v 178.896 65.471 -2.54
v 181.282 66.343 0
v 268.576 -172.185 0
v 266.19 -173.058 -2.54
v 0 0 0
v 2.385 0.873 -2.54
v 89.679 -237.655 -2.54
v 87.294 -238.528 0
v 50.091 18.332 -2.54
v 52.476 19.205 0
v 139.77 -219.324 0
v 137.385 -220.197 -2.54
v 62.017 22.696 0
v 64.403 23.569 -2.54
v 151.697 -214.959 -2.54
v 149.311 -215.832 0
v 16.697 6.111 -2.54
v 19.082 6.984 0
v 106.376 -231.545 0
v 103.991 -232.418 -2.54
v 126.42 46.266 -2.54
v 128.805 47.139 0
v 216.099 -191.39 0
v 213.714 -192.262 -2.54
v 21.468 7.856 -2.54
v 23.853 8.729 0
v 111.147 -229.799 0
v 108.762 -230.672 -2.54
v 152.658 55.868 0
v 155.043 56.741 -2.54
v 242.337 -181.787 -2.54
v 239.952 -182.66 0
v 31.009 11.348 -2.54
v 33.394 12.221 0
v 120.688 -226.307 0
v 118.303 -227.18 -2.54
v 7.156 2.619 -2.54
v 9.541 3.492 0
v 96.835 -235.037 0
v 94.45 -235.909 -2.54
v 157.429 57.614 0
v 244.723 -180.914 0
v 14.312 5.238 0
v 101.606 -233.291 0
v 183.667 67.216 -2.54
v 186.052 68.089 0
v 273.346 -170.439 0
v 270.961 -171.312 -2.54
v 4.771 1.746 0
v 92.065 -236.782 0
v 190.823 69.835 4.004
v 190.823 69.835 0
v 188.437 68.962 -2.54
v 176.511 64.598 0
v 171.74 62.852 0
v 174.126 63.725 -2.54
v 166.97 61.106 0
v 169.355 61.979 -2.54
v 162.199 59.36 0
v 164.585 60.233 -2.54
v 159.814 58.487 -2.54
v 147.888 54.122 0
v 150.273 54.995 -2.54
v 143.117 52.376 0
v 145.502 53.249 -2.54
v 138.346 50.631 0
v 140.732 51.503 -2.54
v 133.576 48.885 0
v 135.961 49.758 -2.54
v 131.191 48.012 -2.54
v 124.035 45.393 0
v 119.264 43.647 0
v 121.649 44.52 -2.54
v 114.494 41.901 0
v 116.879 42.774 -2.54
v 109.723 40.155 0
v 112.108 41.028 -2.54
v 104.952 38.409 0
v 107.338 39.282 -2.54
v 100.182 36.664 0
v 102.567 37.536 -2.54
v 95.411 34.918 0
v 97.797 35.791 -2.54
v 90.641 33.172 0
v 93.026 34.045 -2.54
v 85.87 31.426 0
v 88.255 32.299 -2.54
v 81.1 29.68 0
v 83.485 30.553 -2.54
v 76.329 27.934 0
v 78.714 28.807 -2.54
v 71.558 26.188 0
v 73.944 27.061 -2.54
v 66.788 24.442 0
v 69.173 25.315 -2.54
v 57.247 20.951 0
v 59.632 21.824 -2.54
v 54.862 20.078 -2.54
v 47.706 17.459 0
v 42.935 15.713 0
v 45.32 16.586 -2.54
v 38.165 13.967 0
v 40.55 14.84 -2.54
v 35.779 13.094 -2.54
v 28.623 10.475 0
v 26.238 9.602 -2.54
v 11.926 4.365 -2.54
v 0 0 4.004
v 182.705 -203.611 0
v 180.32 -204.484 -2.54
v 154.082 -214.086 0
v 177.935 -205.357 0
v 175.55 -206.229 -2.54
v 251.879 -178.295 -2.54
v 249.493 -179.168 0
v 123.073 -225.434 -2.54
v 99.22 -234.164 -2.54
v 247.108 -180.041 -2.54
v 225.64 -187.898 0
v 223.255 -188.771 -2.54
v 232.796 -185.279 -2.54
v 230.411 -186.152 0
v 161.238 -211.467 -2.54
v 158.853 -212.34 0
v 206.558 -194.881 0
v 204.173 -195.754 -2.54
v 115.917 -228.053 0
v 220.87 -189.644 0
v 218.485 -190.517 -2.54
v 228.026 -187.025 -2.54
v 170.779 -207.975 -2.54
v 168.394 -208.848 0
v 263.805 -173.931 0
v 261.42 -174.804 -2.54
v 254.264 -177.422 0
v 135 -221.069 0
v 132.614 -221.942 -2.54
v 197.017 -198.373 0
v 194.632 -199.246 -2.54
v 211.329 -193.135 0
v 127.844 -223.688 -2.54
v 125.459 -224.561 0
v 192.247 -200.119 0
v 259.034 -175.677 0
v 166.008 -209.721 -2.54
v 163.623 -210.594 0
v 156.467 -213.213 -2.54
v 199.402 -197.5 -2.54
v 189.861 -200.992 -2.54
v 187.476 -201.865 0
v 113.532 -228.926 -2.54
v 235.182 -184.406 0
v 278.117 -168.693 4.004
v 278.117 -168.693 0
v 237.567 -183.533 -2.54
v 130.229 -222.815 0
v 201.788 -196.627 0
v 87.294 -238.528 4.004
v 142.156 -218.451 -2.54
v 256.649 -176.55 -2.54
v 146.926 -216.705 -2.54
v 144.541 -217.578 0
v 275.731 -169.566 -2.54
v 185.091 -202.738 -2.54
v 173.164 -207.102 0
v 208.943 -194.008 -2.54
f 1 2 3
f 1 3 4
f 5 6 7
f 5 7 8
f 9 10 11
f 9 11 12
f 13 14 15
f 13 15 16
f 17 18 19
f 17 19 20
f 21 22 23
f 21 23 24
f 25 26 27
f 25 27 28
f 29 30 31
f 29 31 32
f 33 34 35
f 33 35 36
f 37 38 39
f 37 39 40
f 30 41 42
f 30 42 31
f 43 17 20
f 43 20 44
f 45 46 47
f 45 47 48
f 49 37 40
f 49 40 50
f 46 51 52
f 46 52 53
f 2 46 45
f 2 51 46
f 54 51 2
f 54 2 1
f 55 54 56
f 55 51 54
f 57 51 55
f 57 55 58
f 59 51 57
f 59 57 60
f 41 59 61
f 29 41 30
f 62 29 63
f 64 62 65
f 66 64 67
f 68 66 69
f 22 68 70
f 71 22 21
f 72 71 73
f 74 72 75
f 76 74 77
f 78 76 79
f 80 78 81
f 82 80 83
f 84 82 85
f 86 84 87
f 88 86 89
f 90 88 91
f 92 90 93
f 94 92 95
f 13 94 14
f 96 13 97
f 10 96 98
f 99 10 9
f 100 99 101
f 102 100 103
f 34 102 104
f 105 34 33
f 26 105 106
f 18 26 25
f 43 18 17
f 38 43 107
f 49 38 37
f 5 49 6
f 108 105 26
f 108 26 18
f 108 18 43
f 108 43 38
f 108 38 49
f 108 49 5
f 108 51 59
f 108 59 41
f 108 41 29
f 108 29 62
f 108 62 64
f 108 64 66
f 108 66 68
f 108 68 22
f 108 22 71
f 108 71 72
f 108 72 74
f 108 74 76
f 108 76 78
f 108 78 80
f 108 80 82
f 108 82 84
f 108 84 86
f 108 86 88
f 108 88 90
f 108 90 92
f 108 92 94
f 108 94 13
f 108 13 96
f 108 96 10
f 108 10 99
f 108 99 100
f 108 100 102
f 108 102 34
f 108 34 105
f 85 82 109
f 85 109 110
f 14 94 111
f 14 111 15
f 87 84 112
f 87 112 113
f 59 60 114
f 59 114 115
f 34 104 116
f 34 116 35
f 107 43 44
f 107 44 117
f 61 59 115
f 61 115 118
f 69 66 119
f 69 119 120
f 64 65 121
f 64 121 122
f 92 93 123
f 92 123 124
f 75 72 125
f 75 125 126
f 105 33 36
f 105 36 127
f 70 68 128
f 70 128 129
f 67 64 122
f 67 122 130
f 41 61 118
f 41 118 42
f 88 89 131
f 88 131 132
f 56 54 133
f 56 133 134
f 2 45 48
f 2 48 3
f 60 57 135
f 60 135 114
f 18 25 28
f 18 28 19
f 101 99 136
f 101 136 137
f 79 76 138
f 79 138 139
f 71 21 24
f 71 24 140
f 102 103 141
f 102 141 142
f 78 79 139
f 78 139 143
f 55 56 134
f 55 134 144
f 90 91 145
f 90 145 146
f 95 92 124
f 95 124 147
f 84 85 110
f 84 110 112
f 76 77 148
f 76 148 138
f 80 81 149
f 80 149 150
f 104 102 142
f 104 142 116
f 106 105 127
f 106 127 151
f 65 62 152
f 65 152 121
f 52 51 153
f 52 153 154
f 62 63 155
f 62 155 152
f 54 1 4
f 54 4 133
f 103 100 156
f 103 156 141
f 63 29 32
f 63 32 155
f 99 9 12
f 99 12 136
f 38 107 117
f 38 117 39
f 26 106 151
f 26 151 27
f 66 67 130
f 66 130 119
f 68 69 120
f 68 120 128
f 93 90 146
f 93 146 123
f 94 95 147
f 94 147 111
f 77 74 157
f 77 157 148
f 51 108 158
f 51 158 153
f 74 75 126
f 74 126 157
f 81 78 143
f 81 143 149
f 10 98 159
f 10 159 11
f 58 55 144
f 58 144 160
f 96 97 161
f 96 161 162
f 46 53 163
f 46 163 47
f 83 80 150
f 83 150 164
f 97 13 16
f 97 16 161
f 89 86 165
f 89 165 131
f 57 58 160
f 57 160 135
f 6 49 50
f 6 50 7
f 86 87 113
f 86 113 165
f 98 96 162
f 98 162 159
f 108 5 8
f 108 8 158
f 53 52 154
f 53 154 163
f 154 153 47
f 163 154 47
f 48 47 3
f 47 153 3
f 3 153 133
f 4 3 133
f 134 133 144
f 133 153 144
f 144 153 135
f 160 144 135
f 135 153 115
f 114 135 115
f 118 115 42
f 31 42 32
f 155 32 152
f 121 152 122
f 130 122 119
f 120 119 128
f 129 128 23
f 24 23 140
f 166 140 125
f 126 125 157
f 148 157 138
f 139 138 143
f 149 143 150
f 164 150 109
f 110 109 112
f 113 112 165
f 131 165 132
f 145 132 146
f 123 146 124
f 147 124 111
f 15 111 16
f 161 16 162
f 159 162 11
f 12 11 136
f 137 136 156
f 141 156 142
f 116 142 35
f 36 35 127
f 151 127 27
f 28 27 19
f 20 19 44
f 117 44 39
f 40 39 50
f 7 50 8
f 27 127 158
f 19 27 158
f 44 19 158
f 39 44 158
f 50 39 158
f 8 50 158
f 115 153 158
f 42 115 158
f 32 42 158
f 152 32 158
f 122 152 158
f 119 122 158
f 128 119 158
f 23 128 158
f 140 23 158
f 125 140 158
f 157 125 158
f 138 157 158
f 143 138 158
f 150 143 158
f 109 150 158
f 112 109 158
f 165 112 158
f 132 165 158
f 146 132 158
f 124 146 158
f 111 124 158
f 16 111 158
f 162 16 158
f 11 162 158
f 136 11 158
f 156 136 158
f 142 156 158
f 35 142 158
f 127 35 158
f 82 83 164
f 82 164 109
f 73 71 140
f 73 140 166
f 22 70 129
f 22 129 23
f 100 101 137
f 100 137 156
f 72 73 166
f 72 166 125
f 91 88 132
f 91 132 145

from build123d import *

# Parameters (mm, degrees)
F3_DEPTH = 254


# Not quite as in the source:
# - a feature of the source that left no trace in its solid (it failed there, or was rolled back) is left out


with BuildPart() as f3:
    # F2 (on face) → F3 (new body)
    with BuildSketch(Plane(origin=(0, 0, 0), x_dir=(-0.9390877837, -0.3436773698, 0), z_dir=(-0.3436773698, 0.9390877837, 0))):
        Polygon((-2.54, -2.54), (0, 0), (0, 4.0038675896), (-203.2, 4.0038675896), (-203.2, 0), (-200.66, -2.54), (-198.12, 0), (-195.58, -2.54), (-193.04, 0), (-190.5, -2.54), (-187.96, 0), (-185.42, -2.54), (-182.88, 0), (-180.34, -2.54), (-177.8, 0), (-175.26, -2.54), (-172.72, 0), (-170.18, -2.54), (-167.64, 0), (-165.1, -2.54), (-162.56, 0), (-160.02, -2.54), (-157.48, 0), (-154.94, -2.54), (-152.4, 0), (-149.86, -2.54), (-147.32, 0), (-144.78, -2.54), (-142.24, 0), (-139.7, -2.54), (-137.16, 0), (-134.62, -2.54), (-132.08, 0), (-129.54, -2.54), (-127, 0), (-124.46, -2.54), (-121.92, 0), (-119.38, -2.54), (-116.84, 0), (-114.3, -2.54), (-111.76, 0), (-109.22, -2.54), (-106.68, 0), (-104.14, -2.54), (-101.6, 0), (-99.06, -2.54), (-96.52, 0), (-93.98, -2.54), (-91.44, 0), (-88.9, -2.54), (-86.36, 0), (-83.82, -2.54), (-81.28, 0), (-78.74, -2.54), (-76.2, 0), (-73.66, -2.54), (-71.12, 0), (-68.58, -2.54), (-66.04, 0), (-63.5, -2.54), (-60.96, 0), (-58.42, -2.54), (-55.88, 0), (-53.34, -2.54), (-50.8, 0), (-48.26, -2.54), (-45.72, 0), (-43.18, -2.54), (-40.64, 0), (-38.1, -2.54), (-35.56, 0), (-33.02, -2.54), (-30.48, 0), (-27.94, -2.54), (-25.4, 0), (-22.86, -2.54), (-20.32, 0), (-17.78, -2.54), (-15.24, 0), (-12.7, -2.54), (-10.16, 0), (-7.62, -2.54), (-5.08, 0), align=None)
    extrude(amount=-F3_DEPTH)


solid = f3.part
